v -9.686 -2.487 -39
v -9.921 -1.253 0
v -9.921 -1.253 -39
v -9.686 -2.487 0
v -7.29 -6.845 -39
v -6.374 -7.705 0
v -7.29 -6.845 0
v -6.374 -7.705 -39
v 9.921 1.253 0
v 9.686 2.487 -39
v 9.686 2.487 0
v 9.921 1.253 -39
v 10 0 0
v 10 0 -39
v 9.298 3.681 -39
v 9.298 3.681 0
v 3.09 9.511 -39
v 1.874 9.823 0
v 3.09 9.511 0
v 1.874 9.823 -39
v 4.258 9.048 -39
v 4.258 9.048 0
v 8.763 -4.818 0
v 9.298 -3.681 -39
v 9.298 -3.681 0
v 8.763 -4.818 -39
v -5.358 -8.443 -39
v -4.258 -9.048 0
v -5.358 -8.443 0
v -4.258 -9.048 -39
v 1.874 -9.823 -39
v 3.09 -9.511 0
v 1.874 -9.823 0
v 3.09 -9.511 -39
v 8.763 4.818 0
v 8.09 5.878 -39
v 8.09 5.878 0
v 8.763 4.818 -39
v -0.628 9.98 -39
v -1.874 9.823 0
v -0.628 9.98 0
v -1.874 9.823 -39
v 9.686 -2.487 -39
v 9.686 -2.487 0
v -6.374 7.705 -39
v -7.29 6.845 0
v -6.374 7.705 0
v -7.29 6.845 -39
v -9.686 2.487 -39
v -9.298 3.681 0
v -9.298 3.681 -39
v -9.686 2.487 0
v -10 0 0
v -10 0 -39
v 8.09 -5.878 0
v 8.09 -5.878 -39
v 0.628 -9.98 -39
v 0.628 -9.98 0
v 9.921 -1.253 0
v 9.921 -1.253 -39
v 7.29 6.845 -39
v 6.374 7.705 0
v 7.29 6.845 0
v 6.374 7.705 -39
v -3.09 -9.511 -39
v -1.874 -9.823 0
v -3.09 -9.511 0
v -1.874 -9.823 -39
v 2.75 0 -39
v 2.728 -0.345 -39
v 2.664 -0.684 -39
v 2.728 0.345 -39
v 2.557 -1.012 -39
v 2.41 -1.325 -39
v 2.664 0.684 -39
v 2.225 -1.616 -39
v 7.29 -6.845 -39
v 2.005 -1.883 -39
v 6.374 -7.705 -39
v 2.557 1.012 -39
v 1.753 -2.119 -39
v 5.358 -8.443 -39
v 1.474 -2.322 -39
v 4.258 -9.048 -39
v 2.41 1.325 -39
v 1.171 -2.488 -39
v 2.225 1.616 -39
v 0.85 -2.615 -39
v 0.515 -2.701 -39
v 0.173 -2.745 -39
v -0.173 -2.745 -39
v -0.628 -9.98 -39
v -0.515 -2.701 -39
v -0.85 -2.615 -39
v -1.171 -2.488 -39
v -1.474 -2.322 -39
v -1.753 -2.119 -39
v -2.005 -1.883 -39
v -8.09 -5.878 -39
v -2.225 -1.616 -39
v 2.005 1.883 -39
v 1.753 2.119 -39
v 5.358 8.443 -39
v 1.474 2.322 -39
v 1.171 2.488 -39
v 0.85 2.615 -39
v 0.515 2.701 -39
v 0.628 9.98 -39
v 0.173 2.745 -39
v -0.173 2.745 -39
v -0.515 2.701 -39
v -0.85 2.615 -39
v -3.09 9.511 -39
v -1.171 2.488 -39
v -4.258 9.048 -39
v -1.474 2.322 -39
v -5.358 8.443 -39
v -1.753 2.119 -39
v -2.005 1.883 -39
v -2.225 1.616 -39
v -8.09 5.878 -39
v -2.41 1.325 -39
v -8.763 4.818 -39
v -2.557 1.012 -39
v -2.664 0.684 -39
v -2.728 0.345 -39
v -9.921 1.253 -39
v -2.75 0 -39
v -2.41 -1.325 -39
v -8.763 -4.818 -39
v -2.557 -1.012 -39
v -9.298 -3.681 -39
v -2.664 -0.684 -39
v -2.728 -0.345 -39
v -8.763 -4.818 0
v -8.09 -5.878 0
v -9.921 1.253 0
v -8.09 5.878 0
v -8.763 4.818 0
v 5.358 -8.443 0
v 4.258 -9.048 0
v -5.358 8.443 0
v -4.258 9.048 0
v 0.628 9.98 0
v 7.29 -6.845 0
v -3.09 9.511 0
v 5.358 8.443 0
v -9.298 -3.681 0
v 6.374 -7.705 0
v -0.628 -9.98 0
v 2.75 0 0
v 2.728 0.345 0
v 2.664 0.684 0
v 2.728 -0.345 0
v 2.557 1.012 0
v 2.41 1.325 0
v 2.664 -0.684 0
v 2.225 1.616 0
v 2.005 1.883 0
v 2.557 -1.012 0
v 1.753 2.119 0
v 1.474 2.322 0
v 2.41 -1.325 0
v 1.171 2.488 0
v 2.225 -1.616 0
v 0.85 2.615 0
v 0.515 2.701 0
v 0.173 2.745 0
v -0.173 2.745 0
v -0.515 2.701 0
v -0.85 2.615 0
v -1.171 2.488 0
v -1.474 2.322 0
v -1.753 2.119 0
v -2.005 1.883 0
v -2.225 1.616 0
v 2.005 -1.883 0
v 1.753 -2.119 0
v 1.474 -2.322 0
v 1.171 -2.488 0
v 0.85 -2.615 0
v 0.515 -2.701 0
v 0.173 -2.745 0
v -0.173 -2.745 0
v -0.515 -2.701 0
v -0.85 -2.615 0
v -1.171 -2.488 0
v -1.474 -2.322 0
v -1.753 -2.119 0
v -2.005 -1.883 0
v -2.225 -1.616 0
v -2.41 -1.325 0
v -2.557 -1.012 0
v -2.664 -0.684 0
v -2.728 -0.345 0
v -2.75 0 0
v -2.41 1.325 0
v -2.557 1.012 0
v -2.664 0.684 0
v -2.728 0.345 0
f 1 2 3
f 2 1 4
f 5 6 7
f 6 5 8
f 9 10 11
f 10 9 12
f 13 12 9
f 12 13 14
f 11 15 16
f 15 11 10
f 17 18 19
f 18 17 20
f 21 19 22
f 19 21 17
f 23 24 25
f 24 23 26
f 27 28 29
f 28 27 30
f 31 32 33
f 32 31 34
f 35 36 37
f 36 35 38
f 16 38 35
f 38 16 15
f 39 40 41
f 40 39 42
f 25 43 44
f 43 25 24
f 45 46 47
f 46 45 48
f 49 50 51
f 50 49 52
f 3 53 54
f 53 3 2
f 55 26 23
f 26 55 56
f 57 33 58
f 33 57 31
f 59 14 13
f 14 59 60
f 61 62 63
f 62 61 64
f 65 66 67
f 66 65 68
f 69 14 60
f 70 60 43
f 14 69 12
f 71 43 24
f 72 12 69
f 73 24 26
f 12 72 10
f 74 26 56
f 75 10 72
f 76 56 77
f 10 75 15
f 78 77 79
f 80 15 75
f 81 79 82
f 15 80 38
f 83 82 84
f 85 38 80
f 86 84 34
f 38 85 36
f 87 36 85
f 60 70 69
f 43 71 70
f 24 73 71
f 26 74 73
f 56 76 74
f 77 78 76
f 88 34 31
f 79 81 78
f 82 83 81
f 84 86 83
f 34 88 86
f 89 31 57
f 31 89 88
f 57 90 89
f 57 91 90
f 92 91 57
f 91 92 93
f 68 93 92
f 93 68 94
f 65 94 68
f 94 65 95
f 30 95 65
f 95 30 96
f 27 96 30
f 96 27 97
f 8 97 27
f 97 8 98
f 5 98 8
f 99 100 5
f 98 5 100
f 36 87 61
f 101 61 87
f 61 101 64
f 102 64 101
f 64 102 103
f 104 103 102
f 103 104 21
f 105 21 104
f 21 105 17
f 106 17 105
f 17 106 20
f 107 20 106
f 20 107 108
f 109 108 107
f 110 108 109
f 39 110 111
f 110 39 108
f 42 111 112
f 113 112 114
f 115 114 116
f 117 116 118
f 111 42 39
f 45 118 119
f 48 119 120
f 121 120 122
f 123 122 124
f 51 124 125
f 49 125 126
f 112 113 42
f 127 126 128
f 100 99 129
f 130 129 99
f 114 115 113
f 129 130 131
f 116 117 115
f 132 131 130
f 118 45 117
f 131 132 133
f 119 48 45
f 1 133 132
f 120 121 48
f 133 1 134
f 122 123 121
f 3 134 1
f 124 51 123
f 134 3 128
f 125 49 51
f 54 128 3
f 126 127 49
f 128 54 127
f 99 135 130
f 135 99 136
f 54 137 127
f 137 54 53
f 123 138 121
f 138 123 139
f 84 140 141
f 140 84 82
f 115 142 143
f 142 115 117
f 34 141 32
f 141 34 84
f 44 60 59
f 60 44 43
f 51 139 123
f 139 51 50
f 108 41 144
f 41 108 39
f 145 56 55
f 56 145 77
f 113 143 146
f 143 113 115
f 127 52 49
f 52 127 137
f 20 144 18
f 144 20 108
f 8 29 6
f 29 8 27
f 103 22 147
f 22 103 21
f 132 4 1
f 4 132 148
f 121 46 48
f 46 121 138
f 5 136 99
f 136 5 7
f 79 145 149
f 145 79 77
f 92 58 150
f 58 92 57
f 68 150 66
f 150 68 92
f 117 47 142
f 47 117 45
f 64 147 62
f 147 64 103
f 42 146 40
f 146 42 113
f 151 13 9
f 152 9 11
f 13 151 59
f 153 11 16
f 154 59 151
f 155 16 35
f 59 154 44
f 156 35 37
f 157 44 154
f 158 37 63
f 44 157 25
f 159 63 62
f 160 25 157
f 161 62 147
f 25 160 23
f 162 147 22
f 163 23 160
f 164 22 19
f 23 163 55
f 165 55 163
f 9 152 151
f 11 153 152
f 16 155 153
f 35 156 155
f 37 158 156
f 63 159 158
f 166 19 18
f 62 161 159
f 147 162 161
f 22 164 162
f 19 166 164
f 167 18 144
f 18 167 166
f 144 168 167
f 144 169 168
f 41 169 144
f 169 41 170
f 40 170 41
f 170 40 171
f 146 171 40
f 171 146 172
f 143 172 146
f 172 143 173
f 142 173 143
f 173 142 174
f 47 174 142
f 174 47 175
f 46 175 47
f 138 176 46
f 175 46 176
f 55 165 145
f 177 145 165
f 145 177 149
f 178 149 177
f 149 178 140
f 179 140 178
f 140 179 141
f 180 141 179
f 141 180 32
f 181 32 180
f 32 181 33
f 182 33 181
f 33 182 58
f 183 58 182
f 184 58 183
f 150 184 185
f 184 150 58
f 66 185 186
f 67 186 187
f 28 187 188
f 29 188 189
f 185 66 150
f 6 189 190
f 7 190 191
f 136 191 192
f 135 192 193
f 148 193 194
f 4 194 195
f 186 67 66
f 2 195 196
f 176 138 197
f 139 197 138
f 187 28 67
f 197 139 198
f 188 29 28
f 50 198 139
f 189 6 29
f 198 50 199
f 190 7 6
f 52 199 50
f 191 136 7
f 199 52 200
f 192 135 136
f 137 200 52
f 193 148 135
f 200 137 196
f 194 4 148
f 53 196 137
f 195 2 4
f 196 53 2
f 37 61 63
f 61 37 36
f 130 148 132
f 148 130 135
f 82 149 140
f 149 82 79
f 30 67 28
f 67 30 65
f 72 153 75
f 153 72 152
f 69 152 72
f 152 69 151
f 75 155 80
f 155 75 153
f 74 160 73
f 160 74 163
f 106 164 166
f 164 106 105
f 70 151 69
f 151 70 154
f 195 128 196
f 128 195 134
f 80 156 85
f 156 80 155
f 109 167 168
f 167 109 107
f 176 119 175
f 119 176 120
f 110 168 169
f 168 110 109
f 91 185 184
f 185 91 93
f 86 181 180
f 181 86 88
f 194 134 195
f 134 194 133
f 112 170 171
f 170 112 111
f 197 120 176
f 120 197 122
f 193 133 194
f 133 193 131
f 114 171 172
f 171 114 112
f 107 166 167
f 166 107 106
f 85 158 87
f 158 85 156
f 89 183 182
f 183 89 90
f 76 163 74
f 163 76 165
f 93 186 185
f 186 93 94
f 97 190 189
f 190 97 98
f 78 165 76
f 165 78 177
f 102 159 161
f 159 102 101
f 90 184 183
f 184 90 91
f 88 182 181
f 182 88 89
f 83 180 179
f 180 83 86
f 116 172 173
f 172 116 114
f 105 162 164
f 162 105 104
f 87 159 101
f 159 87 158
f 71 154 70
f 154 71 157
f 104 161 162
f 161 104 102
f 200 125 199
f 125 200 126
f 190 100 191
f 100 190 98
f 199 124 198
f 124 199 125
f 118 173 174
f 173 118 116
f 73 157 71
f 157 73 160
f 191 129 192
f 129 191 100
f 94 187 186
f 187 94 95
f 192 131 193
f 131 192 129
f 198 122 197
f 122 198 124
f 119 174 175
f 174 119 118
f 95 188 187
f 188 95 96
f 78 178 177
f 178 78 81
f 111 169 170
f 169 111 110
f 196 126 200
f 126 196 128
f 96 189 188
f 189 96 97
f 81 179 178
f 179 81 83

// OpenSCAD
$fn = 50;


difference() {
	union() {
		translate(v = [0, 0, -39.0000000000]) {
			cylinder(h = 39, r = 10.0000000000);
		}
	}
	union() {
		#translate(v = [0, 0, -39]) {
			cylinder(h = 39, r = 2.7500000000);
		}
	}
}
